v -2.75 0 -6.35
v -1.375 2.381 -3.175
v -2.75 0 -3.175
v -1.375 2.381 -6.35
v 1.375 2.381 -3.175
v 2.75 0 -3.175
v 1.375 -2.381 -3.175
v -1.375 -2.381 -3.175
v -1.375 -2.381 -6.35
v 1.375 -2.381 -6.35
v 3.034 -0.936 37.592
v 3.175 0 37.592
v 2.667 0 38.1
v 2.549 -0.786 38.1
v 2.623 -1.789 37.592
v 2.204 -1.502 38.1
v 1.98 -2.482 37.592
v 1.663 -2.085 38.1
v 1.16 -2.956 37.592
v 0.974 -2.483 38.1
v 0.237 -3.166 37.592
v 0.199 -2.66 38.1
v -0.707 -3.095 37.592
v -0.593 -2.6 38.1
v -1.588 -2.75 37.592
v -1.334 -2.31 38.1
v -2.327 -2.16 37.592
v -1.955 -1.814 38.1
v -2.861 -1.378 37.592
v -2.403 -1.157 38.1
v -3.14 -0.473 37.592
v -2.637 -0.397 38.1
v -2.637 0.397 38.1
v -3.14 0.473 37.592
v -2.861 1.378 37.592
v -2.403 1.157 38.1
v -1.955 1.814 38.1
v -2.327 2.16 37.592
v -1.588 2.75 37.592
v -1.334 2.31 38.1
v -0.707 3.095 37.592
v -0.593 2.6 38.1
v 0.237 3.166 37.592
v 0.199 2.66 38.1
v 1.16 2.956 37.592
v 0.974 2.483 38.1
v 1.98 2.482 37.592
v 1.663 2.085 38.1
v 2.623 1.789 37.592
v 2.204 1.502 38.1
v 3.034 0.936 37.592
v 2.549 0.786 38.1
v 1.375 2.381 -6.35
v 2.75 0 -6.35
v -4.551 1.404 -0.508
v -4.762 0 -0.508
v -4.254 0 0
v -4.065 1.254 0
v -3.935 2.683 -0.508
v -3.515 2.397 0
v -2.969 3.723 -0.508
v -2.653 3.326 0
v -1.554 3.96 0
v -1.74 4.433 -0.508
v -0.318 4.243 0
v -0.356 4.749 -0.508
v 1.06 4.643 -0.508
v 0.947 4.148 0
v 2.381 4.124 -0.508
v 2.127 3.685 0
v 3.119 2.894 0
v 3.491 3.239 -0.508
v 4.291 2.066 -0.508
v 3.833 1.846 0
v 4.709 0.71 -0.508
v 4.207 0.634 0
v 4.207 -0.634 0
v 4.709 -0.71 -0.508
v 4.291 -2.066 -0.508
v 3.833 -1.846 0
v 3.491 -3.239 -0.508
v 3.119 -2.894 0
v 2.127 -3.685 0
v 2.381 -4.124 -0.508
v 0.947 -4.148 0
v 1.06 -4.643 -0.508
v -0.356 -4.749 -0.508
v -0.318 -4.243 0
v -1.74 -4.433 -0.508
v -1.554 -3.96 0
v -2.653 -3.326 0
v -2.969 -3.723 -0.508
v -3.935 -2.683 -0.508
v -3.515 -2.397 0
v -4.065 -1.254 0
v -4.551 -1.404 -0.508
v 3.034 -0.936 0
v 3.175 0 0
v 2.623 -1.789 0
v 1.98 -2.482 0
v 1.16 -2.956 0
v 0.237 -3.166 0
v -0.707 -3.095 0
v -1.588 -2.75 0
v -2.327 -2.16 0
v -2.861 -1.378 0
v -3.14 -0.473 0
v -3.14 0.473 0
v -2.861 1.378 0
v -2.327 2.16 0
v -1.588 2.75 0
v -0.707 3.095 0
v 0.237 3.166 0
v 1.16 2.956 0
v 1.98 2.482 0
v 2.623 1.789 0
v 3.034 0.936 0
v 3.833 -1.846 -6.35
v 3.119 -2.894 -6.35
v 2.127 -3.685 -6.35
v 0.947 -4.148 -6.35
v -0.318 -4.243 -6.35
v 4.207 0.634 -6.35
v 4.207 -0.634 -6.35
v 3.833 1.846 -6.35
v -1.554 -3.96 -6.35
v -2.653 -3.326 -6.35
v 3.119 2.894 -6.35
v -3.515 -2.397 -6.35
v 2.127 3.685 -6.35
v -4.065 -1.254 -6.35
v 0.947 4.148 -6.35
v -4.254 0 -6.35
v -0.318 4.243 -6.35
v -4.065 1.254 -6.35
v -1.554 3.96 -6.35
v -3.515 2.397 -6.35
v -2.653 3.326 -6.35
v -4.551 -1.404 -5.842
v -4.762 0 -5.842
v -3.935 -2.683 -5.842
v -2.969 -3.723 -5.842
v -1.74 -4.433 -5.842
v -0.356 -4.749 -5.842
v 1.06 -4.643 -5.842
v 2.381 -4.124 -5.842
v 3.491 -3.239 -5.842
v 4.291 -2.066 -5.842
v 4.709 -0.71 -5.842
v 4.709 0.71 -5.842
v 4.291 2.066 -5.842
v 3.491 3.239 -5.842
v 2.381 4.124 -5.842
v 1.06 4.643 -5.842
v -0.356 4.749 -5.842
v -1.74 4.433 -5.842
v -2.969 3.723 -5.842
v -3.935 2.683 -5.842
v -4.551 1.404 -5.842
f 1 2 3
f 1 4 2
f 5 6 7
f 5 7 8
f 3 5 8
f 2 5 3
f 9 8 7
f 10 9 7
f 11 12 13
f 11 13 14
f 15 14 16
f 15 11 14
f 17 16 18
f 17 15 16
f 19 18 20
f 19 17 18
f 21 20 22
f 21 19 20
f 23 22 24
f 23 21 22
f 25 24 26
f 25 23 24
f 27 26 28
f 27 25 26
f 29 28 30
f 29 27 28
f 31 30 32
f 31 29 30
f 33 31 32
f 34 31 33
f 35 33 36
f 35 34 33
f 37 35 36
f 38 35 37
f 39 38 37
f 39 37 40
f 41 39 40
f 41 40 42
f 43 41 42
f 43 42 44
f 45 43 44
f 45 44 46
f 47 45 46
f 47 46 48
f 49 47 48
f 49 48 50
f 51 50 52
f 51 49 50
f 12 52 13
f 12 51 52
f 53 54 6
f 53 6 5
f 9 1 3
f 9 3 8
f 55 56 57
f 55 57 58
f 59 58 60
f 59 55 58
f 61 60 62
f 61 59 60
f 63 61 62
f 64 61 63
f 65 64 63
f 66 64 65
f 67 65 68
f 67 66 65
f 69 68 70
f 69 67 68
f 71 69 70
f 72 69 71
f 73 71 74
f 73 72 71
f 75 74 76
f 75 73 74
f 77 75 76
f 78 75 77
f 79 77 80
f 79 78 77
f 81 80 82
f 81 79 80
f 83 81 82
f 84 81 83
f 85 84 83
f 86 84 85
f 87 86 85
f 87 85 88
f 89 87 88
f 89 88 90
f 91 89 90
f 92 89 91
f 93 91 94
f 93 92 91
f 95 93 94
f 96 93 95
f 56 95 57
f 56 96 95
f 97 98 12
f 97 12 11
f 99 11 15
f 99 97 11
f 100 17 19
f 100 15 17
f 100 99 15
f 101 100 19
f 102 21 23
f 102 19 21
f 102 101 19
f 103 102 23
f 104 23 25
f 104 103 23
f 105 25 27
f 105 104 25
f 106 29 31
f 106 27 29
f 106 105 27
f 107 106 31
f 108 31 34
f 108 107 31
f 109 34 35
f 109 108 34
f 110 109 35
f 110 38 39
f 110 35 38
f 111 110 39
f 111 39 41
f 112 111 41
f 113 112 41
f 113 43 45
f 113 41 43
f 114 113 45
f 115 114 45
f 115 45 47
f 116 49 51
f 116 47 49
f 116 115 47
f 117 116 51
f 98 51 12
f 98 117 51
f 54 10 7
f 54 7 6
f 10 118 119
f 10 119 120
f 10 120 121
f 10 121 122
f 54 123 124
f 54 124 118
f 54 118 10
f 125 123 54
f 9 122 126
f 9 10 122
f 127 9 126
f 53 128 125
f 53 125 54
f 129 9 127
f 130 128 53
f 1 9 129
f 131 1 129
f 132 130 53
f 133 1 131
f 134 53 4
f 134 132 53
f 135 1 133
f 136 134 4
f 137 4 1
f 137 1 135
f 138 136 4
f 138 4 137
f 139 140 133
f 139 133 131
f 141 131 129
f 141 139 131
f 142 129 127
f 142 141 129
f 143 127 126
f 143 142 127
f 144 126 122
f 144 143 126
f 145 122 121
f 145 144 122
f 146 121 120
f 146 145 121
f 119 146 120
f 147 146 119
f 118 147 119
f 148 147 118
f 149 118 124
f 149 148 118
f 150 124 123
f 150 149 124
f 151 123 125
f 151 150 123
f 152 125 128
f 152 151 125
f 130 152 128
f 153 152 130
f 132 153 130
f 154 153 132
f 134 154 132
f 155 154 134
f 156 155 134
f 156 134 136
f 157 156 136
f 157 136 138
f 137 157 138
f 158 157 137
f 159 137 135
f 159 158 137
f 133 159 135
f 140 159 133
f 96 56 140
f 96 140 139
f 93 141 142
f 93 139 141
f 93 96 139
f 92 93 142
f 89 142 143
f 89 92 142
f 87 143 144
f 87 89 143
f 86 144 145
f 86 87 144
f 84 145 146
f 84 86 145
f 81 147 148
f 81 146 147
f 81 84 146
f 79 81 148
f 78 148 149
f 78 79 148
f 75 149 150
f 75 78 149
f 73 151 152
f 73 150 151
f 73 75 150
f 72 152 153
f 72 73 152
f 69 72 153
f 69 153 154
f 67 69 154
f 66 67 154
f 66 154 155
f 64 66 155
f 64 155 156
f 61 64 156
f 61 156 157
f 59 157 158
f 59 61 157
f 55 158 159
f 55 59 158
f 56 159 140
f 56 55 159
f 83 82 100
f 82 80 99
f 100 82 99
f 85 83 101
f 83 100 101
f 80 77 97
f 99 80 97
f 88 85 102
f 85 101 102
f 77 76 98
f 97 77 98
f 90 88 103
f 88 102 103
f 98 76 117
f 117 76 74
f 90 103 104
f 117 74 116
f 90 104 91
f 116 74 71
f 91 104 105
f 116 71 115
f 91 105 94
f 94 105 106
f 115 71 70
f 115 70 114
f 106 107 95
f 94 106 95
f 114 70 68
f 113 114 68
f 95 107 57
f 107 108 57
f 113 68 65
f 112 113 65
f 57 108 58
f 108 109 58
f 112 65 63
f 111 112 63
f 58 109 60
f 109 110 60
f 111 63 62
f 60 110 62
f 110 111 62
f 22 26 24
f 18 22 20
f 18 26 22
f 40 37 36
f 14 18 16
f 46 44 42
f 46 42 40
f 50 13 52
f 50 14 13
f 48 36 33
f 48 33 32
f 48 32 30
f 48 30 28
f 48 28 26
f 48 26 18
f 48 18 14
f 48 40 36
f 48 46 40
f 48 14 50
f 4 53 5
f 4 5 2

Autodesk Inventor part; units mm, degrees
ref_plane "YZ Plane" through (0, 0, 0) normal (1, 0, 0) x (0, 1, 0)
ref_plane "XZ Plane" through (0, 0, 0) normal (0, 1, 0) x (-1, 0, 0)
ref_plane "XY Plane" through (0, 0, 0) normal (0, 0, 1) x (1, 0, 0)
sketch "Sketch1" plane through (0, 0, 0) normal (0, 0, 1) x (1, 0, 0)
  circle A0 centre (0, 0) radius 3.175
  dimension "d0" = 6.35
extrude "Extrusion1" add sketch "Sketch1" along normal blind 38.1
sketch "Sketch2" plane through (0, 0, 0) normal (0, 0, -1) x (-1, 0, 0)
  circle A0 centre (0, 0) radius 3.175 projected
  circle A1 centre (0, 0) radius 4.7625
  dimension "d3" = 9.525
extrude "Extrusion2" add sketch "Sketch2" along normal blind 6.35 contours A0 | A1
sketch "Sketch3" plane through (0, 0, -6.35) normal (0, 0, -1) x (-1, 0, 0)
  circle A0 centre (0, 0) radius 4.7625 projected
  line L0 (-1.3748, 2.3812) -> (1.3748, 2.3813)
  line L1 (1.3748, 2.3813) -> (2.7496, 0)
  line L2 (2.7496, 0) -> (1.3748, -2.3812)
  line L3 (1.3748, -2.3812) -> (-1.3748, -2.3812)
  line L4 (-1.3748, -2.3812) -> (-2.7496, 0)
  line L5 (-2.7496, 0) -> (-1.3748, 2.3812)
  dimension "d6" = 4.7625
extrude "Extrusion3" cut sketch "Sketch3" against normal blind 3.175 contours L0 L1 L2 L3 L4 L5
chamfer "Chamfer1" distance 0.508 angle 45 3 edges at (-3.175, 0, 38.1) (4.7625, 0, 0) (4.7625, 0, -6.35)
thread "Thread1" size "1/4-20 UNC" class "2A" standard "ANSI Unified Screw Threads" length 25.4
properties part number "14-20 x750" material "Steel"
